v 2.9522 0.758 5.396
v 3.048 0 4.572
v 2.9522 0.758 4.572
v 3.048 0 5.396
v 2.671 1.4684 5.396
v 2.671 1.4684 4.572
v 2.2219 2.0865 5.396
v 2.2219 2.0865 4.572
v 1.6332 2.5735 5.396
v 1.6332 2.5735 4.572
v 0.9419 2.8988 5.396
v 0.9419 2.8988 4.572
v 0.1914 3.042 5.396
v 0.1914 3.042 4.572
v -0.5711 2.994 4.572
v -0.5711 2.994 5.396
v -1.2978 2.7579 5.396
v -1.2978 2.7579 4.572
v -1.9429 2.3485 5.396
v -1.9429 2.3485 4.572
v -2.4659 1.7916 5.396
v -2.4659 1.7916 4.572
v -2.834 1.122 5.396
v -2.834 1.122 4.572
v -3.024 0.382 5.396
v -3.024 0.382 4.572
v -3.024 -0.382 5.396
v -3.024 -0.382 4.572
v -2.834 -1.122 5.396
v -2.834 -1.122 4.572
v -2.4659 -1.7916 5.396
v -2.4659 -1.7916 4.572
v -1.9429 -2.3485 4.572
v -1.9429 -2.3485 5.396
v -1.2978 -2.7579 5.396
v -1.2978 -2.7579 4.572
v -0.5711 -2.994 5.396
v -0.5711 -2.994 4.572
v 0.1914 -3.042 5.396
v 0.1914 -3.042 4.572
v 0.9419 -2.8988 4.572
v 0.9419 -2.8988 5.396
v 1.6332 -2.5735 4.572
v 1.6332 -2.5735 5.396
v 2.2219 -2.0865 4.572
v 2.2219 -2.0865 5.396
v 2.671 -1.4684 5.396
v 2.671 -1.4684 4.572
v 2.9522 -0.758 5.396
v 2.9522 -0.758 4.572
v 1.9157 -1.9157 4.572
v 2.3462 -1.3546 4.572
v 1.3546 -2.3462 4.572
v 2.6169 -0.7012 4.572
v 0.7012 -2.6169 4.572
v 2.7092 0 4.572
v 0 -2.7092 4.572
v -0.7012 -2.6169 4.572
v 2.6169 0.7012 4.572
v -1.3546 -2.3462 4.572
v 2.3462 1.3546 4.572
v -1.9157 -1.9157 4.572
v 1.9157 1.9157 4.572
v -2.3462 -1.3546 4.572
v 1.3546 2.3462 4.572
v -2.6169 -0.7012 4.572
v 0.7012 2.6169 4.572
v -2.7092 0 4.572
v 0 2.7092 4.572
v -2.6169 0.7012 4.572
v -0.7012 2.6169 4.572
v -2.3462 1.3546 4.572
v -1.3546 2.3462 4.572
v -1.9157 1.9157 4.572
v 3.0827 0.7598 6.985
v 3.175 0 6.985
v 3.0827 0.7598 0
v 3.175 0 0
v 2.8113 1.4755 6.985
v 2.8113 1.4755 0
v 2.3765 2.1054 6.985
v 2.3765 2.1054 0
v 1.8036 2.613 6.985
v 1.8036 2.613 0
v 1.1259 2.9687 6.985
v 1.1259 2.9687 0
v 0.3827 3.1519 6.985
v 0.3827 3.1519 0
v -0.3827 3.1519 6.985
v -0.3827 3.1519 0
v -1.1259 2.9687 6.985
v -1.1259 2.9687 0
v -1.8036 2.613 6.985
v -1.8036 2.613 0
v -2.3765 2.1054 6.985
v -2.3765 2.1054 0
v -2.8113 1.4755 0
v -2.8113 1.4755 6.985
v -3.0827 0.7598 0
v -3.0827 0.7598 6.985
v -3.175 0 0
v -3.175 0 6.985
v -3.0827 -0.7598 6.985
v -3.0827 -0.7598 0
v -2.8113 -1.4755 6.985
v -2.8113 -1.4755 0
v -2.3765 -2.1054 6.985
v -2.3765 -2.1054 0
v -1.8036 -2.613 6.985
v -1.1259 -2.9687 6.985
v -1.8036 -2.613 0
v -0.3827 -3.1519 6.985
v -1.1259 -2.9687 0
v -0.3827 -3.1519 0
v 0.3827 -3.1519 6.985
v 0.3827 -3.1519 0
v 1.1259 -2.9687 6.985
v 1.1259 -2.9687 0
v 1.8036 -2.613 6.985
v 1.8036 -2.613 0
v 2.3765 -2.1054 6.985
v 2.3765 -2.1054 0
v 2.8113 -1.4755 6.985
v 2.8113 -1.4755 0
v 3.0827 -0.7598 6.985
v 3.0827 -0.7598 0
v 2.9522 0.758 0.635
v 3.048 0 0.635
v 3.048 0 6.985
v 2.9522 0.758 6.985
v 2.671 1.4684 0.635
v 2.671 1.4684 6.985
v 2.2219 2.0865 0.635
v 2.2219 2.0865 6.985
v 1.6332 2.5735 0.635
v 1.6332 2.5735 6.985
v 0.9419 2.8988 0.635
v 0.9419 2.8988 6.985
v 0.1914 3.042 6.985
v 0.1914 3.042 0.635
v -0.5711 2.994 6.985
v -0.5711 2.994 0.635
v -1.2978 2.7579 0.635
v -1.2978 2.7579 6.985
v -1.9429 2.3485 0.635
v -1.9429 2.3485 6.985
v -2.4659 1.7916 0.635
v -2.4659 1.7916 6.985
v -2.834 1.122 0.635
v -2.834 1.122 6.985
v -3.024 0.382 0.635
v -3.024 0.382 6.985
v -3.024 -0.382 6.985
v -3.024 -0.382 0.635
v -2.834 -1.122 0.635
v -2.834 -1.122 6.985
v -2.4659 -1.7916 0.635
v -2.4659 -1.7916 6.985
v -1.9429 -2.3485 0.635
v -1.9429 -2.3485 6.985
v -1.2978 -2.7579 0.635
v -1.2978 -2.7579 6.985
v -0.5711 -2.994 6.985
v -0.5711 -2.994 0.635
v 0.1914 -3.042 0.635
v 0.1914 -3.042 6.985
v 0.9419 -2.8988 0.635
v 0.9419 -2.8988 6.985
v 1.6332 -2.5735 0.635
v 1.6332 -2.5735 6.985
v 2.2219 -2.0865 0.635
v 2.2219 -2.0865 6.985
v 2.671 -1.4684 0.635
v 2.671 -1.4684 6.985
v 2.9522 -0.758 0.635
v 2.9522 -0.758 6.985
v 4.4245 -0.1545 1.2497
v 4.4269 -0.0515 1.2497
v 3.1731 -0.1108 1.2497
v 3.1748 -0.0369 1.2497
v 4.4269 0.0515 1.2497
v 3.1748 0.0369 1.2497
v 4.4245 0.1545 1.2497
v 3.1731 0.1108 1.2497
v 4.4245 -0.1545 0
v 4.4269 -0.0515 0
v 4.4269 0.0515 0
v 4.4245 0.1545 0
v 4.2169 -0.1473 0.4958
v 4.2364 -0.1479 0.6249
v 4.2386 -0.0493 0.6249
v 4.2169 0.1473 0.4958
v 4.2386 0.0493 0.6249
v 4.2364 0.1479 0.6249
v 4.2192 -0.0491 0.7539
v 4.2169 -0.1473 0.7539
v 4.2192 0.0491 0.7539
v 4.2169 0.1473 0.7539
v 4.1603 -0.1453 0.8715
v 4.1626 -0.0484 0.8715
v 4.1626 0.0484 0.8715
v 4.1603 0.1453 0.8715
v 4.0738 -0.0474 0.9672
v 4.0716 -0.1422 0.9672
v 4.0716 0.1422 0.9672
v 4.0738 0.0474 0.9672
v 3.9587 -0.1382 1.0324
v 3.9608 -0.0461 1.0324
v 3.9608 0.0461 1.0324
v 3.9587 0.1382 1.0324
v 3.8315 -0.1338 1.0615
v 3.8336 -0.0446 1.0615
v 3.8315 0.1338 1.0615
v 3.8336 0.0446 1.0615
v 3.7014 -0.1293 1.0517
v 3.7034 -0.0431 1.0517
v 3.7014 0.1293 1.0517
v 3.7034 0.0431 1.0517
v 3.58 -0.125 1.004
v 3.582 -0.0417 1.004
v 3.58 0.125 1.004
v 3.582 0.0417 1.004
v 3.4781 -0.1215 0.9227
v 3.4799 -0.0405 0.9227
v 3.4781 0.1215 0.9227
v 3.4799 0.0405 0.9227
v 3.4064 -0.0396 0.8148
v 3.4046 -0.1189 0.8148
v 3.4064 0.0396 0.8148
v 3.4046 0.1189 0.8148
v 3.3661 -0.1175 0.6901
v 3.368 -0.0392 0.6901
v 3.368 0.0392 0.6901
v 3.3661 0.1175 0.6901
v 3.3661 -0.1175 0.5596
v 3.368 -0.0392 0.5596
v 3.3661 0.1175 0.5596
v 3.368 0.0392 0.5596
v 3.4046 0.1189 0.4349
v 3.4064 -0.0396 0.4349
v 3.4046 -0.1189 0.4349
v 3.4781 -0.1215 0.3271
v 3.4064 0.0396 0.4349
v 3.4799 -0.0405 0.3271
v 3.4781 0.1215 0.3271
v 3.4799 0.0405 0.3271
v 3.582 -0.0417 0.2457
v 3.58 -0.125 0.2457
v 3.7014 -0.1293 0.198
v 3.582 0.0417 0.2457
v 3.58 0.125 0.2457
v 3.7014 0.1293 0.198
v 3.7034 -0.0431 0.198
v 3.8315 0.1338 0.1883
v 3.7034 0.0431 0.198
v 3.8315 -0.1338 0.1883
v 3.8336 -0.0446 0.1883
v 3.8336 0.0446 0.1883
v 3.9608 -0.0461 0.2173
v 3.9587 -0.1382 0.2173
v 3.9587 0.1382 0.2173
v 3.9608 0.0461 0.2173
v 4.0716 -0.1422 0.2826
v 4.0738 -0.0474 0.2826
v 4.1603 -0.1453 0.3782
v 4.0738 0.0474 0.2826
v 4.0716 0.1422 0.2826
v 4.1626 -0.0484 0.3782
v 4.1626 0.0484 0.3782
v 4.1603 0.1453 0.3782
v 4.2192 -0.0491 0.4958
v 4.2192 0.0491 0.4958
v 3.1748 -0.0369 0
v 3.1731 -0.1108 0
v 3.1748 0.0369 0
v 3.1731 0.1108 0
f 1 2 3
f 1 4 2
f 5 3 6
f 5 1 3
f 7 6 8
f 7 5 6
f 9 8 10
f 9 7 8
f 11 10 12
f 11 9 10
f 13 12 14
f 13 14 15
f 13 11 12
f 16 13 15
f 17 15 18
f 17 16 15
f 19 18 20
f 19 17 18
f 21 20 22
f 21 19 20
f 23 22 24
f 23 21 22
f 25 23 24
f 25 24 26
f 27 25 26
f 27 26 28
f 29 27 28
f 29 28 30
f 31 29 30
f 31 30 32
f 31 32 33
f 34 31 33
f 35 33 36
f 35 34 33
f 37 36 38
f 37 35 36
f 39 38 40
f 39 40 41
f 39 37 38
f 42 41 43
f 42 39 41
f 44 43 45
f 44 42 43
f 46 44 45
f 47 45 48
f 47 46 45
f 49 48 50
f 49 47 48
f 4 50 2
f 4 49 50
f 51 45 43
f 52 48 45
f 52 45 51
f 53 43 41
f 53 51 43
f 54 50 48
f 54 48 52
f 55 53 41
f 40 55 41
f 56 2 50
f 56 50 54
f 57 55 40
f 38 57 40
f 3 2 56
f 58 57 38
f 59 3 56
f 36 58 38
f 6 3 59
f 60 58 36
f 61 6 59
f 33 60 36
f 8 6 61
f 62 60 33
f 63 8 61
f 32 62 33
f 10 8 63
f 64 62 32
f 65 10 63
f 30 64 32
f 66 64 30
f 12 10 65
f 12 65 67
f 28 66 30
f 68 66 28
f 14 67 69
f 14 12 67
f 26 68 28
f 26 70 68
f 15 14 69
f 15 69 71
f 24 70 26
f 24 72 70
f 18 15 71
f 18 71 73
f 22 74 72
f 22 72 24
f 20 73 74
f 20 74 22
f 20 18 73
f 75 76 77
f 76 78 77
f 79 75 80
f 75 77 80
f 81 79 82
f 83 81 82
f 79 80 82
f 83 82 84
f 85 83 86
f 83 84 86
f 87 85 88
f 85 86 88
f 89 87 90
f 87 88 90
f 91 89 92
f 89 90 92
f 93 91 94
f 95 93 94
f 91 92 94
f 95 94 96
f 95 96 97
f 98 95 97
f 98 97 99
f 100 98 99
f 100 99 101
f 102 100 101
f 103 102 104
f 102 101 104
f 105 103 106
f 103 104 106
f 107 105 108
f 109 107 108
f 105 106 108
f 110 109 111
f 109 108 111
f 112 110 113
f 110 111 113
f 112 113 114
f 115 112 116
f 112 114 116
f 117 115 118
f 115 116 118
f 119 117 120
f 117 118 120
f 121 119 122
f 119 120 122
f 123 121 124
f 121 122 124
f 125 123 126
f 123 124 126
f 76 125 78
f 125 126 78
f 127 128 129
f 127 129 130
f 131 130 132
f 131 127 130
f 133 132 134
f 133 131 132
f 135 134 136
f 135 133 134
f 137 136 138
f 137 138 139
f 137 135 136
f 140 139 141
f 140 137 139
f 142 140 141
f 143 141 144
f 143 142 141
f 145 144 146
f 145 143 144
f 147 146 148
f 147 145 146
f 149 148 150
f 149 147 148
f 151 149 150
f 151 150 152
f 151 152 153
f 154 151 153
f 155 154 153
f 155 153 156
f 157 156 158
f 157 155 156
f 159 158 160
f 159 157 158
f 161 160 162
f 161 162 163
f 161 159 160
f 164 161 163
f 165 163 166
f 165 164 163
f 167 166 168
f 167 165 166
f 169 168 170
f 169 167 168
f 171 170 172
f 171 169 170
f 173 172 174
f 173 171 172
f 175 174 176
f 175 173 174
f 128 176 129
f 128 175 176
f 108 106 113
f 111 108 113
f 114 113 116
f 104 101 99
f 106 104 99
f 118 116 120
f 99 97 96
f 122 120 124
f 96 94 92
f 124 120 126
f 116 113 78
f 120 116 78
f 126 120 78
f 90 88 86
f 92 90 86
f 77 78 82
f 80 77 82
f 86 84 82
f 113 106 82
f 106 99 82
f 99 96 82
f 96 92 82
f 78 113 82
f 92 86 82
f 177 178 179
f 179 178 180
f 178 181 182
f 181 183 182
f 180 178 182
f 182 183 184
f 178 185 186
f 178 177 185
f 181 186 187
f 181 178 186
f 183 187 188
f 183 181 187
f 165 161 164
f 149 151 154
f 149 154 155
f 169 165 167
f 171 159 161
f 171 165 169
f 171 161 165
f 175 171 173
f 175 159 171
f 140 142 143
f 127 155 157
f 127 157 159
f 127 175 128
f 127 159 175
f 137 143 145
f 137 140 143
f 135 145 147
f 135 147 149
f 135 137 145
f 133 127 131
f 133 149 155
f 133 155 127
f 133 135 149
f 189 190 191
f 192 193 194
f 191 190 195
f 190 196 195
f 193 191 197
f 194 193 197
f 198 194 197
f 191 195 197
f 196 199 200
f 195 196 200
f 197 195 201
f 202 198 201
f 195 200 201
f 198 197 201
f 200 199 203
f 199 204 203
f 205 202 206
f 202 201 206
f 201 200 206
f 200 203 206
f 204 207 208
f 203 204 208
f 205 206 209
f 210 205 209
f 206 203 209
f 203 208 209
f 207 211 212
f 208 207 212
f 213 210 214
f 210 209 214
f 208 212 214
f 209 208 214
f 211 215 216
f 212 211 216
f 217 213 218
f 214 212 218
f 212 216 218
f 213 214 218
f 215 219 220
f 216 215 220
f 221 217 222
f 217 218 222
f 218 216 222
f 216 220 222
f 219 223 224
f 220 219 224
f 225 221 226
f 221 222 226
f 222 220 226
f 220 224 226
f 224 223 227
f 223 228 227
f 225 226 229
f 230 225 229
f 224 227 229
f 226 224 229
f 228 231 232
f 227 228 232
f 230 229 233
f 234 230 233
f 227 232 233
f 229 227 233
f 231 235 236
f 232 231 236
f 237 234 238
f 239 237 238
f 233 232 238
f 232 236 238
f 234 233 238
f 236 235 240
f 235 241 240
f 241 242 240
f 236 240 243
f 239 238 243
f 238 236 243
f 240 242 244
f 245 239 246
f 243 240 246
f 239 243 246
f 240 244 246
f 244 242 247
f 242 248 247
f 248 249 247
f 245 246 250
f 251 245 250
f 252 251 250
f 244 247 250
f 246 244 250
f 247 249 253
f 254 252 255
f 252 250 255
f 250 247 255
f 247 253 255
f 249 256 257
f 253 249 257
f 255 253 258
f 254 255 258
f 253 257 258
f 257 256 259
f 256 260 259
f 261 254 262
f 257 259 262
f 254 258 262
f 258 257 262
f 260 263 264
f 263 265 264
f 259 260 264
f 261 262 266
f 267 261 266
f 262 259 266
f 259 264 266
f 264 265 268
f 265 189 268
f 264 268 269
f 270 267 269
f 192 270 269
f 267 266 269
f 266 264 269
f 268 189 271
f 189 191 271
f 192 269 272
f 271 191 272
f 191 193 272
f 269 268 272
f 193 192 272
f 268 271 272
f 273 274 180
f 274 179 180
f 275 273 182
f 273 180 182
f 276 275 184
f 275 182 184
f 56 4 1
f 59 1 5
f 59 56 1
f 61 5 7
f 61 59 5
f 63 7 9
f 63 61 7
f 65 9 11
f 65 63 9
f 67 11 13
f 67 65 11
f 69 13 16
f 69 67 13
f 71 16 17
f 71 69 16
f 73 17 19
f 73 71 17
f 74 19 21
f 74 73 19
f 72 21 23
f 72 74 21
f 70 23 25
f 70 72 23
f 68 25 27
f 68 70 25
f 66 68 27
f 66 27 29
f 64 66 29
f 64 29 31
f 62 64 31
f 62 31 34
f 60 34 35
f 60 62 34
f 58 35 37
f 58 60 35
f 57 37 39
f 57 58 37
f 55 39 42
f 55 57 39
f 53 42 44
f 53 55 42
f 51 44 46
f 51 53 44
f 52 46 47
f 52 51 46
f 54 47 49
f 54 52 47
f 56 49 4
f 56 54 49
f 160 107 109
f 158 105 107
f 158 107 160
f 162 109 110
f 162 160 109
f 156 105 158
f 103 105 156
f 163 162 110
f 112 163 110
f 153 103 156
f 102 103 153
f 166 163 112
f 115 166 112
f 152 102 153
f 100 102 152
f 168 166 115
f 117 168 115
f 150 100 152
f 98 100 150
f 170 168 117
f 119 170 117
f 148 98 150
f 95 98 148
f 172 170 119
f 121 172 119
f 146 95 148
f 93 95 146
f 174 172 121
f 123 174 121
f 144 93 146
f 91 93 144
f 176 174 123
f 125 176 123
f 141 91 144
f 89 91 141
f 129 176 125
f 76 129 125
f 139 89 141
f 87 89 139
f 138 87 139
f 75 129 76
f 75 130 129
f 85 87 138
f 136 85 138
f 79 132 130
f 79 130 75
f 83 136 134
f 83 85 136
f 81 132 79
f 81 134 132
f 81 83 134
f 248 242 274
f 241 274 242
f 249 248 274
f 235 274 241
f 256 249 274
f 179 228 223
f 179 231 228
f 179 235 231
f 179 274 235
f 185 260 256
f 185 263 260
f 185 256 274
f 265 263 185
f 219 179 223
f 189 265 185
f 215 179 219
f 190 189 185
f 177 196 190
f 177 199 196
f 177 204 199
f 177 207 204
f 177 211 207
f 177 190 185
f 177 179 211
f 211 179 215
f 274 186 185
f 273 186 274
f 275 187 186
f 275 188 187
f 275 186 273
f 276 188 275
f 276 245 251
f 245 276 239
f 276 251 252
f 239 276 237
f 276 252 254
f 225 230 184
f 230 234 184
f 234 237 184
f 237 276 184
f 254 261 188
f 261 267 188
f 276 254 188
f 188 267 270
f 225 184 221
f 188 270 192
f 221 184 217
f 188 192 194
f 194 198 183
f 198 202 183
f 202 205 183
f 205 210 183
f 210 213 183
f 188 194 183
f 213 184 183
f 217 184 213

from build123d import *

# Parameters (mm, degrees)
F0_R          = 3.175
F1_DEPTH      = 0.635
F2_R          = 3.175
F2_R_2        = 3.048
F3_DEPTH      = 6.35
F7_W          = 1.2522329904
F7_H          = 1.2497299402
F7_R          = 0.4378185344
F8_ANGLE_BACK = 2
F8_ANGLE      = 4


with BuildPart() as f1:
    # F0 (on Top) → F1 (new body)
    with BuildSketch(Plane.XY):
        Circle(F0_R)
    extrude(amount=F1_DEPTH)

    # F2 (on face) → F3 (join)
    with BuildSketch(Plane.XY.offset(0.635)):
        Circle(F2_R)
        Circle(F2_R_2, mode=Mode.SUBTRACT)
    extrude(amount=F3_DEPTH)


with BuildPart() as f6:
    # F4 (on Front) → F6 (revolve)
    with BuildSketch(Plane.XZ):
        Polygon((3.048, 4.572), (3.048, 5.3960434188), (2.7091750678, 4.572), align=None)
    revolve(axis=Axis((0, 0, 12.5352637842), (0, 0, 1)))


with BuildPart() as f8:
    # F7 (on Front) → F8 (revolve)
    with BuildSketch(Plane.XZ, mode=Mode.PRIVATE) as f8_sk:
        with Locations((3.8011164952, 0.6248649701)):
            Rectangle(F7_W, F7_H)
        with Locations((3.8011164952, 0.6248649701)):
            Circle(F7_R, mode=Mode.SUBTRACT)
    revolve(f8_sk.sketch.rotate(Axis((0, 0, 12.5352637842), (0, 0, 1)), -F8_ANGLE_BACK), axis=Axis((0, 0, 12.5352637842), (0, 0, 1)), revolution_arc=F8_ANGLE)


solid = Compound([f1.part, f6.part, f8.part])
